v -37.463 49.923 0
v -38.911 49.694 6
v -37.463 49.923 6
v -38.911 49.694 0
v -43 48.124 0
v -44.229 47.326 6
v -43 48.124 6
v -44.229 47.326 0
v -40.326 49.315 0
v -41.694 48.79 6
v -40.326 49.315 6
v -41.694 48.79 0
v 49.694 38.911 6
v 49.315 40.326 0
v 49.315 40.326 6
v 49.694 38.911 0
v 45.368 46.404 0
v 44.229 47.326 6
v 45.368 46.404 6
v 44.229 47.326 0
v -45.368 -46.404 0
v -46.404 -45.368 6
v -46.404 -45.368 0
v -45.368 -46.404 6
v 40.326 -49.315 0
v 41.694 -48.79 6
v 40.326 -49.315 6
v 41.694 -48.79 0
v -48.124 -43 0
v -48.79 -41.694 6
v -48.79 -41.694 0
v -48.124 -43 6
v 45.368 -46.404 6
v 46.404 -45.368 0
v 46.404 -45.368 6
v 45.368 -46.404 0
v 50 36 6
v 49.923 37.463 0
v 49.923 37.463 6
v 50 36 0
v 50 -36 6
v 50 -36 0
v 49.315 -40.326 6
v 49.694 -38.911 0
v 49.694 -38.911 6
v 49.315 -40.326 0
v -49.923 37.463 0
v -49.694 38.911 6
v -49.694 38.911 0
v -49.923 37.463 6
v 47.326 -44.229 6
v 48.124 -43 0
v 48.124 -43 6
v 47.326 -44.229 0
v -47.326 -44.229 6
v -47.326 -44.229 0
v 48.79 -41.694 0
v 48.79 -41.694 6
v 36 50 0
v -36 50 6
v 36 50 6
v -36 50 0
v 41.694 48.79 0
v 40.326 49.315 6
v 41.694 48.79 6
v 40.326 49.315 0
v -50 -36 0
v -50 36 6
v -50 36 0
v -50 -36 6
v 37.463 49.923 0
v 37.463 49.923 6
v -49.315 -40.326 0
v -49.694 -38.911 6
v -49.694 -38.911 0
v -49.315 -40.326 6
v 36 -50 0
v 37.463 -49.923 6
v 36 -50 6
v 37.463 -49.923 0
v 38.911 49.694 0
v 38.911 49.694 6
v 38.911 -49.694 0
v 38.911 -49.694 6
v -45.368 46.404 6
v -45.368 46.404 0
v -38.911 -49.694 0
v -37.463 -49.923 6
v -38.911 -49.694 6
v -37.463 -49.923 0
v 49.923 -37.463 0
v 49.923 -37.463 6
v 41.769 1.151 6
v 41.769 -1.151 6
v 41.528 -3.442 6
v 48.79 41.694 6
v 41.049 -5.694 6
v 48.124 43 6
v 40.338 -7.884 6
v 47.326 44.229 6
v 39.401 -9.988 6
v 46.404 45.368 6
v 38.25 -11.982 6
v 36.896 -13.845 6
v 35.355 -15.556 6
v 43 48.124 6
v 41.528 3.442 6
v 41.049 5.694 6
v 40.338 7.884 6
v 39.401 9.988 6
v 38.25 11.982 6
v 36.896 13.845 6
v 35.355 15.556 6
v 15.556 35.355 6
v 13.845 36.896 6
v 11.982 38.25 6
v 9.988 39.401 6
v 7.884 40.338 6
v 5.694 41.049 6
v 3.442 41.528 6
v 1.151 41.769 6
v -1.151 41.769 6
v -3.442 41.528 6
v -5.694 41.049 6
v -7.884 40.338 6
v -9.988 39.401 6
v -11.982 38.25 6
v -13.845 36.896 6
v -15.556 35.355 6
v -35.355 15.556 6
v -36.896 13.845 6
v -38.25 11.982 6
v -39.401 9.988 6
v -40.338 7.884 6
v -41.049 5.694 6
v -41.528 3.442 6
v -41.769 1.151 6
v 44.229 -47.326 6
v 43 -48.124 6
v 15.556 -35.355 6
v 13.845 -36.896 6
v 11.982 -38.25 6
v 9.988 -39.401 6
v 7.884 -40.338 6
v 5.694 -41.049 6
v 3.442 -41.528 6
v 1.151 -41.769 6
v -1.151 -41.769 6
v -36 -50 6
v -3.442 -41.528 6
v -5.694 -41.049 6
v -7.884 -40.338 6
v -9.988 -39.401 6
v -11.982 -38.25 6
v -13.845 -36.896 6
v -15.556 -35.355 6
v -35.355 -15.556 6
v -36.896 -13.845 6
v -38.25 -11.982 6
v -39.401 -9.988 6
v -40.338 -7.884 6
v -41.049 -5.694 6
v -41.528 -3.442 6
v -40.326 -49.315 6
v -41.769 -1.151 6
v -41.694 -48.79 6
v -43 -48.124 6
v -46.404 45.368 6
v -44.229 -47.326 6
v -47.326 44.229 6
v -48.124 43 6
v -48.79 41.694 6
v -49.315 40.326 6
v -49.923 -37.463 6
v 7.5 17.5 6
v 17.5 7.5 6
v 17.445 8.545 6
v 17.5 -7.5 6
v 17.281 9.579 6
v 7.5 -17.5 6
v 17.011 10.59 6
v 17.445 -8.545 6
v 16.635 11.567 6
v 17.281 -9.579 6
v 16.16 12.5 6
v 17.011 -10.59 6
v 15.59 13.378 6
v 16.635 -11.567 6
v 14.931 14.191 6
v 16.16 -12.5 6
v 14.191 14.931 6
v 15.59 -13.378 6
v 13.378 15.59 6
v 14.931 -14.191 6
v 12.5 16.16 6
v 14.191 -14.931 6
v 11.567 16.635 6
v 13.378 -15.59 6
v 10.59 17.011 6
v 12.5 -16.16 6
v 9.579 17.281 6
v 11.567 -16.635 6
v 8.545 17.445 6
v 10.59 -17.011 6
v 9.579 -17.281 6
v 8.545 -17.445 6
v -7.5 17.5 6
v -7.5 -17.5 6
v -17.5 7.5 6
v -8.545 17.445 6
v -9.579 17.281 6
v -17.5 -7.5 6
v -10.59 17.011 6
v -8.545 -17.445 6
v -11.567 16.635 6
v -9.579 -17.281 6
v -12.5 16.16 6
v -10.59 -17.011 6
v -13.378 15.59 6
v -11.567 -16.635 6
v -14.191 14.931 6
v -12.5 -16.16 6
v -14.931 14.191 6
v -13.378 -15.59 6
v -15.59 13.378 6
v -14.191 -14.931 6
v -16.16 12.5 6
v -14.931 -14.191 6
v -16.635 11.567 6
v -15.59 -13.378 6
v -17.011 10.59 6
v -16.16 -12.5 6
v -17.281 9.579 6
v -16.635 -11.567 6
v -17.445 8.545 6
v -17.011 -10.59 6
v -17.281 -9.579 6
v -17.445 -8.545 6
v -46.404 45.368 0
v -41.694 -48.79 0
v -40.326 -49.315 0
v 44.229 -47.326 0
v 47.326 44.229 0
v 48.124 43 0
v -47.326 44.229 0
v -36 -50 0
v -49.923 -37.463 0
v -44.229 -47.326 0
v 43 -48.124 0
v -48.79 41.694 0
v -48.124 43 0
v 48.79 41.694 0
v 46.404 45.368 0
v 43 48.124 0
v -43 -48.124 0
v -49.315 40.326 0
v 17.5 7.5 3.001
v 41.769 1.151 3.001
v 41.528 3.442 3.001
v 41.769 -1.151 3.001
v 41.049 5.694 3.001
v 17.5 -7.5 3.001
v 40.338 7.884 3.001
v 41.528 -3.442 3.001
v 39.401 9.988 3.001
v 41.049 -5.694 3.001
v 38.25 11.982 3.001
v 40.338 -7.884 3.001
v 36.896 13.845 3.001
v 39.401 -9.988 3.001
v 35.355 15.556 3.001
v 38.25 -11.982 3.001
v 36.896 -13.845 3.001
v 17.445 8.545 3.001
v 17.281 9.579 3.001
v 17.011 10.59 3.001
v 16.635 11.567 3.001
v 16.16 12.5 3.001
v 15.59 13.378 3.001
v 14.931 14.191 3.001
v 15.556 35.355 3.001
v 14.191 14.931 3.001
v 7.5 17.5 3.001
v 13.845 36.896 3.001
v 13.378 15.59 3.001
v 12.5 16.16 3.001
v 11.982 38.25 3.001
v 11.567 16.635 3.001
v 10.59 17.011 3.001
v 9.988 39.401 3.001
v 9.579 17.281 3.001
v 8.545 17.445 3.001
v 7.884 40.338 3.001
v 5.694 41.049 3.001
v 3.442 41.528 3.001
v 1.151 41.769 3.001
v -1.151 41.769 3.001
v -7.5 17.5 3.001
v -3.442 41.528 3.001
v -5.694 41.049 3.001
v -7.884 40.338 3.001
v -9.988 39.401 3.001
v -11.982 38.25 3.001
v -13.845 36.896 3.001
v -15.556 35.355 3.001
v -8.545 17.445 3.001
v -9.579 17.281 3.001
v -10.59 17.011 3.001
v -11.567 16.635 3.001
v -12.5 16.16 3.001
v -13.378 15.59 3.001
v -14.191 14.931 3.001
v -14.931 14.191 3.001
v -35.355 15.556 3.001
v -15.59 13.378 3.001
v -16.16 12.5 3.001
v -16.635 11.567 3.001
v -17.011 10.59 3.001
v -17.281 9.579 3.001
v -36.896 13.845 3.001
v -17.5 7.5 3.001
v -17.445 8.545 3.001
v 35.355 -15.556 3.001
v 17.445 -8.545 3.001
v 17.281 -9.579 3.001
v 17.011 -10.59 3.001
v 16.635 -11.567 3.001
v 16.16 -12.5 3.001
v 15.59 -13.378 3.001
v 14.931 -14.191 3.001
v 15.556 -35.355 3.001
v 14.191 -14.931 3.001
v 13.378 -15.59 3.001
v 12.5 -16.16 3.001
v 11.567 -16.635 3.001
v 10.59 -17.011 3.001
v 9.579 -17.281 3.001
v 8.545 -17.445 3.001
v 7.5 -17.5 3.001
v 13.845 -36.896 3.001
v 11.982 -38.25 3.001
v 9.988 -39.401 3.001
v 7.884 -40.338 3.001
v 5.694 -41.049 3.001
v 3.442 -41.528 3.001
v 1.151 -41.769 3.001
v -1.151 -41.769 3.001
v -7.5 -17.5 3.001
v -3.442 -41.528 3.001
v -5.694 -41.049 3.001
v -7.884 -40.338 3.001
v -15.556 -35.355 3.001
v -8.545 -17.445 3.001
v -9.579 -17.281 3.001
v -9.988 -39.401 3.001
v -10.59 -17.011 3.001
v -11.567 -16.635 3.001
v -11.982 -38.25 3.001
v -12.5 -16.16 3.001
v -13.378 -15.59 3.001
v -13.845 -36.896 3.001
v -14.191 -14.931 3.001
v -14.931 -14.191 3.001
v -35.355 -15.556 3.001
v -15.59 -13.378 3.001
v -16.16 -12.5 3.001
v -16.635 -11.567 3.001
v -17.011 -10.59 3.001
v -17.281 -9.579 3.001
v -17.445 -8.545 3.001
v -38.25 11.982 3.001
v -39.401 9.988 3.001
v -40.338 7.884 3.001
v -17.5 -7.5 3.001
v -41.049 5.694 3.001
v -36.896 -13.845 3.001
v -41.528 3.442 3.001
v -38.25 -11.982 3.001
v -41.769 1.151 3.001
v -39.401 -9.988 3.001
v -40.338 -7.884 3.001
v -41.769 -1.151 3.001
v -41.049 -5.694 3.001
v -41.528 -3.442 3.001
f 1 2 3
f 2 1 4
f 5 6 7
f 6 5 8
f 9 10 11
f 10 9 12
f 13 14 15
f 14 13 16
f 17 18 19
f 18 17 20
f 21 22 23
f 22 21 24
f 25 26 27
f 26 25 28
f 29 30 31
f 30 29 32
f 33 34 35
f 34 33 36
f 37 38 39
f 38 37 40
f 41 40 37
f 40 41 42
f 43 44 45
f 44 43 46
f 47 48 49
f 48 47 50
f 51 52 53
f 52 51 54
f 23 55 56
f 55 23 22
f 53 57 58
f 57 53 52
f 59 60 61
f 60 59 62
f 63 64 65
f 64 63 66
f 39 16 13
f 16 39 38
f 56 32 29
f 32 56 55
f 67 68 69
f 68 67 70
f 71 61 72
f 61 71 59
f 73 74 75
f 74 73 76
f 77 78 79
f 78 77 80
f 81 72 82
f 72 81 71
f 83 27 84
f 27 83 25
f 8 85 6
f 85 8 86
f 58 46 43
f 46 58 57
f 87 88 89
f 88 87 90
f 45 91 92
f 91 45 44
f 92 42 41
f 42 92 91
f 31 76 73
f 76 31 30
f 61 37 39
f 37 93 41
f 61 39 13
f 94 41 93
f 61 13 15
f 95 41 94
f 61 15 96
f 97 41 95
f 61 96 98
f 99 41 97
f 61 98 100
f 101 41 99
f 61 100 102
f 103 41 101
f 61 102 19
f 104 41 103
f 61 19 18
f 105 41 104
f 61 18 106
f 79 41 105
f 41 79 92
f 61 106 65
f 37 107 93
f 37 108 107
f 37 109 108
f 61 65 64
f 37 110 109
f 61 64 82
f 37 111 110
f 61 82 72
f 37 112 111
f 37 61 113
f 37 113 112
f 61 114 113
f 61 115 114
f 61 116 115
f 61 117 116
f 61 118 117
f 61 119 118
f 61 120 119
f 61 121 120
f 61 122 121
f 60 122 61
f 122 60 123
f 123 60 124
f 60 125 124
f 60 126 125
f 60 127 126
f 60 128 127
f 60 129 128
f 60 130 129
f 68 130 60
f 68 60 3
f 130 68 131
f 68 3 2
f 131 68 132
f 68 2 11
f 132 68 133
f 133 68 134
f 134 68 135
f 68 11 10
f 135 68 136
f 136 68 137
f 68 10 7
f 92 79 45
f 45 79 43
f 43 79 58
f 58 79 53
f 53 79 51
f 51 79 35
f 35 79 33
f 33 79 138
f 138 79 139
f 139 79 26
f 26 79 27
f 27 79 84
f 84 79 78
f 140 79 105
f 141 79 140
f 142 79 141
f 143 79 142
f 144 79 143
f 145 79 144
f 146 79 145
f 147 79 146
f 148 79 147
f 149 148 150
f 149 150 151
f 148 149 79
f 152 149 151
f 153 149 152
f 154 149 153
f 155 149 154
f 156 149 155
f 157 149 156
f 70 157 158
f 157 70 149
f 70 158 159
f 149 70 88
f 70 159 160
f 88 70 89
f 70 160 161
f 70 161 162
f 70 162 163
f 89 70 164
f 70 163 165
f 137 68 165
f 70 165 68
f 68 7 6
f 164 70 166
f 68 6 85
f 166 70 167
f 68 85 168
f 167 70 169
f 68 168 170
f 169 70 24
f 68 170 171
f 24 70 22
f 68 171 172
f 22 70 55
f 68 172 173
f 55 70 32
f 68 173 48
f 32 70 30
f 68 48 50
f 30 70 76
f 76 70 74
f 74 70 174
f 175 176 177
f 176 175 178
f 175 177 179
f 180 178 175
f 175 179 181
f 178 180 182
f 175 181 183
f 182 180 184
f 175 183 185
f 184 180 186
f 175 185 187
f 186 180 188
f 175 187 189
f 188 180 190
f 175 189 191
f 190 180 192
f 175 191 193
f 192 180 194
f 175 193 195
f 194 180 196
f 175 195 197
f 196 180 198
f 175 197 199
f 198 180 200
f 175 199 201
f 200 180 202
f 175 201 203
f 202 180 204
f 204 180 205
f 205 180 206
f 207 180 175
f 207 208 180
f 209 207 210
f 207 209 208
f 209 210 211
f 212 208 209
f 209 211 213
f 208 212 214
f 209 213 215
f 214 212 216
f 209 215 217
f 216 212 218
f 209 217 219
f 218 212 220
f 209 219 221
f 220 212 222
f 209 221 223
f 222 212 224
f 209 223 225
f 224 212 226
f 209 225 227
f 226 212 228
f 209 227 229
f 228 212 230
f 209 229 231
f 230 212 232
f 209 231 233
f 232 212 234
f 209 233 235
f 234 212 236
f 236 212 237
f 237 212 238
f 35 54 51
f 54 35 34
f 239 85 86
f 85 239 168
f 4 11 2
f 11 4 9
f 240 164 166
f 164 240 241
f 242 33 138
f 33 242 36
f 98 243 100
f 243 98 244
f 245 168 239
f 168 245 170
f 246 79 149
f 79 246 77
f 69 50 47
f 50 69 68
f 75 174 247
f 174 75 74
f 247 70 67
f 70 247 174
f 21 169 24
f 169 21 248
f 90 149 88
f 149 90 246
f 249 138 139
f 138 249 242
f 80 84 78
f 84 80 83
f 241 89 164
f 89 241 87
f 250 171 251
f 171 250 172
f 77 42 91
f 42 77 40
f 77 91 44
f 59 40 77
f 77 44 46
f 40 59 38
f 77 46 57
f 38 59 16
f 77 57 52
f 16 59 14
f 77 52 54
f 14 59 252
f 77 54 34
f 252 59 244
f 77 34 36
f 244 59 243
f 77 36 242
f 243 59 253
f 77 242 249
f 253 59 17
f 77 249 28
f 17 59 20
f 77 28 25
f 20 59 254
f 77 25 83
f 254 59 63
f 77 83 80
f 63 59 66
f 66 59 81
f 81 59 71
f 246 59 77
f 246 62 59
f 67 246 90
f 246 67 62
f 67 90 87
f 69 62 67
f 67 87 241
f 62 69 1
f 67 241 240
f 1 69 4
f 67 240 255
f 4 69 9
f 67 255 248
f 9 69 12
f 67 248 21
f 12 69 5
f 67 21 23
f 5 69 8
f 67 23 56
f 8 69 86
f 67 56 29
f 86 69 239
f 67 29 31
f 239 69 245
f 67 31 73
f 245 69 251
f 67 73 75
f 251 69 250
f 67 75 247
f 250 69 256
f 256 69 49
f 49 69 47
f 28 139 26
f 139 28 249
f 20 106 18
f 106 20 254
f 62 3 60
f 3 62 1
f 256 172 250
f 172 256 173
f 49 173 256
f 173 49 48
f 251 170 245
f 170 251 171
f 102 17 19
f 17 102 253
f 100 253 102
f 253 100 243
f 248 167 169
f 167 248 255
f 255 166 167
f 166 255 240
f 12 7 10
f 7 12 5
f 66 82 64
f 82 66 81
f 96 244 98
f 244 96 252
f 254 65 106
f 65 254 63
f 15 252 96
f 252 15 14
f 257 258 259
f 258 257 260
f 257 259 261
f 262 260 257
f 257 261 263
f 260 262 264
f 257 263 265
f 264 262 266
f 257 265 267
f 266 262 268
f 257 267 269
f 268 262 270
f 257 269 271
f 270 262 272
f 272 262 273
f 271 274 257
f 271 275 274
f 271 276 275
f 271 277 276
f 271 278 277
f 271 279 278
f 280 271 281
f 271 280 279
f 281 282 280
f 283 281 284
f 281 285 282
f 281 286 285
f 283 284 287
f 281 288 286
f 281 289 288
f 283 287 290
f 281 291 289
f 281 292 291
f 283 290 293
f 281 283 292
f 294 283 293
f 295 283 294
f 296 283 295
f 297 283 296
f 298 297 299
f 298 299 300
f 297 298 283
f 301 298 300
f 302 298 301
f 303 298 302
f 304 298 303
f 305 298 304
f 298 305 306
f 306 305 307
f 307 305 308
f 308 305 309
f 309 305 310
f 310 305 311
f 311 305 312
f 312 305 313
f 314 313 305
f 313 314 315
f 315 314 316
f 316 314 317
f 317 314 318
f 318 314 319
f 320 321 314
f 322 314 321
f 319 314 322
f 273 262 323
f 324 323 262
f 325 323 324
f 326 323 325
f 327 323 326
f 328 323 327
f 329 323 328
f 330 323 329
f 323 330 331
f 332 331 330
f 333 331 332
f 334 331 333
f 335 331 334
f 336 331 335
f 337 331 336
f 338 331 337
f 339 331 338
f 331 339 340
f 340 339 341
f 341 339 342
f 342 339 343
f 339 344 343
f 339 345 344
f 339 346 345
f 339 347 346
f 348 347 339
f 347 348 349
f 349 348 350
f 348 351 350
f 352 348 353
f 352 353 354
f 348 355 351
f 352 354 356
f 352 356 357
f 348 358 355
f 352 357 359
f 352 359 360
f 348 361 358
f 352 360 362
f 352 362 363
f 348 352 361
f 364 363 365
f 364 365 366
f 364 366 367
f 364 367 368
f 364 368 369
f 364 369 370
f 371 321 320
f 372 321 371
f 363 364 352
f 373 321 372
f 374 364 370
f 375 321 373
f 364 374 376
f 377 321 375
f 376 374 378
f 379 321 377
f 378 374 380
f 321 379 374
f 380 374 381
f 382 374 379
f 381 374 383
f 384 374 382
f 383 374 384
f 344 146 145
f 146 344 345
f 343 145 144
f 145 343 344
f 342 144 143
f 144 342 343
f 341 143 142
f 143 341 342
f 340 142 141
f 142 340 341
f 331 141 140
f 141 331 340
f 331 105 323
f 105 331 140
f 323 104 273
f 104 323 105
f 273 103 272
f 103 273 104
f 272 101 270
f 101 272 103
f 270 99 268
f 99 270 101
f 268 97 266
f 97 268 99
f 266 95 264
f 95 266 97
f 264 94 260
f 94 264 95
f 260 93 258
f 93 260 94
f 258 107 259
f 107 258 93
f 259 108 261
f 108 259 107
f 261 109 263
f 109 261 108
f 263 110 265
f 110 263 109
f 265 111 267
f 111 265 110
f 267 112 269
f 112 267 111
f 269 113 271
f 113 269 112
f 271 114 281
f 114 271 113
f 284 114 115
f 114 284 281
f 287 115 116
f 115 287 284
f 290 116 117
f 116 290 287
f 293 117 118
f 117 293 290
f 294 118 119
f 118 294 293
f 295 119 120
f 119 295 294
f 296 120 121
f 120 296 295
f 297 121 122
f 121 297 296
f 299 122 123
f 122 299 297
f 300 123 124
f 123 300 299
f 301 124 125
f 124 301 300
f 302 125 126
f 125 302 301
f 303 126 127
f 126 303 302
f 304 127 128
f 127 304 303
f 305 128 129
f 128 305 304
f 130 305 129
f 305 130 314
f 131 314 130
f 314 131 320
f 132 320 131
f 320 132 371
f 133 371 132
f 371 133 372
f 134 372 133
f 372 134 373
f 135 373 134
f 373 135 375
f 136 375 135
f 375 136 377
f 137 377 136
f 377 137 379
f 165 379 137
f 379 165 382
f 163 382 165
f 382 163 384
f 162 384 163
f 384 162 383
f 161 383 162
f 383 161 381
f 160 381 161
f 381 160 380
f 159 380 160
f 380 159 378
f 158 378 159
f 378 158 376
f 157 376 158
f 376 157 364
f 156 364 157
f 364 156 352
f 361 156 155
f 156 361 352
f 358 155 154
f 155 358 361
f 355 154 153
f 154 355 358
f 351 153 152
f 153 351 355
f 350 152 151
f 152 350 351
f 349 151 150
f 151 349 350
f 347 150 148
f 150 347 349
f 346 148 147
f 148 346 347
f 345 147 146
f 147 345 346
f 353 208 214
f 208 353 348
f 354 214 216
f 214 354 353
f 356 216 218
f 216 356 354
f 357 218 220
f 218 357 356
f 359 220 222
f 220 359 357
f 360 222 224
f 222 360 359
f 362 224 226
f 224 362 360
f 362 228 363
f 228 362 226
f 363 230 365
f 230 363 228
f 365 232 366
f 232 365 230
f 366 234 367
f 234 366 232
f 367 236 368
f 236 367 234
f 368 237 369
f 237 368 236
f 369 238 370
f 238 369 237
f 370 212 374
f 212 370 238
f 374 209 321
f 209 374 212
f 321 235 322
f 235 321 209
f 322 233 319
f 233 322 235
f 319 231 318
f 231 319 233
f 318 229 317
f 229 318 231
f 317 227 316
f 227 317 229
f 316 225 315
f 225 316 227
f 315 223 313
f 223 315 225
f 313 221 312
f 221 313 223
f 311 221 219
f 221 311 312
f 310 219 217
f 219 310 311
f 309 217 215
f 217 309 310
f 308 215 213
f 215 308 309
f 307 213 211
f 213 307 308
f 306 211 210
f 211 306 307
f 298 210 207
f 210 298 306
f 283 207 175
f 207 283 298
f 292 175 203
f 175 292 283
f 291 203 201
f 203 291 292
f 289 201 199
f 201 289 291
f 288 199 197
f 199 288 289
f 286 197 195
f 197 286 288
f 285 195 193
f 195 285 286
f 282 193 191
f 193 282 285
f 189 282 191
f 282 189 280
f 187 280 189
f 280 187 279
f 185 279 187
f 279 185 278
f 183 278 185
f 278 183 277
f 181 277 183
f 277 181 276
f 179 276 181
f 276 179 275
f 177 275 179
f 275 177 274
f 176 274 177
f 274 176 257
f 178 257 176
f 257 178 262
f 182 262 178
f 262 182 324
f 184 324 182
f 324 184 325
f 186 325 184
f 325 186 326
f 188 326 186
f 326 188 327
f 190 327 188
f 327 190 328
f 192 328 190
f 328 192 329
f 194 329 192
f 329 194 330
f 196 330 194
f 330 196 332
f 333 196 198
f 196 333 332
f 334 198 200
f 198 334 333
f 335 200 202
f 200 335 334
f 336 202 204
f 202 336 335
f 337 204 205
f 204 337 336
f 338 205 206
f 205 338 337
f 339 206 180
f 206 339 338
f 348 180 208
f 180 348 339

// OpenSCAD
// file: coaster_lib.scad
$fa = 6;
$fs = 0.875;

module coaster_base_3d(size, thickness, border_radius) {
    linear_extrude(height = thickness) {
        minkowski() {
            cube_size = size - border_radius * 2;

            square(size = [cube_size, cube_size], center = true);
            circle(r = border_radius);
        }
    }
}

module epayslips_logo_2d(size) {
    difference() {
        rotate(a = 45)
        minkowski() {
            roundness = 22;
            cube_size = size * 0.5 - roundness;

            square(size = [cube_size, cube_size], center = true);
            circle(r = roundness);
        }

        minkowski() {
            roundness = 10;
            cube_size = size * 0.25 - roundness;

            square(size = [cube_size, cube_size], center = true);
            circle(r = roundness);
        }
    }
}

module datacode_logo_2d(size) {
    difference() {
        rotate(a = 45 / 2)
        minkowski() {
            roundness = 8;
            circle(r = size * 0.38 - roundness, $fn = 8);
            circle(r = roundness);
        }

        circle(r = size * 0.12);

        translate([0, size / 4, 0]) {
            square(size = [size * 0.1, size / 2], center = true);
        }
    }
}

module sj_logo_2d(size) {
    rotate(a = 45 / 2)
    difference() {
        roundness = 8;

        minkowski() {
            circle(r = size * 0.45 - roundness, $fn = 8);
            circle(r = roundness);
        }

        minkowski() {
            circle(r = size * 0.385 - roundness, $fn = 8);
            circle(r = roundness);
        }
    }

    text_size = size * 0.2;
    text_offset = text_size / 2 + 2;

    translate([0, text_offset, 0])
    text(
        text = "JAC",
        halign = "center",
        valign = "center",
        font = "Roboto Mono for Powerline:style=Bold",
        size = size * 0.2
    );

    translate([0, -text_offset, 0])
    text(
        text = "UZI",
        halign = "center",
        valign = "center",
        font = "Roboto Mono for Powerline:style=Bold",
        size = size * 0.2
    );
}
// main file
include<coaster_lib.scad>;

$fa = 6;
$fs = 0.875;

size = 100;
border_radius = 14;
thickness = 6;

difference() {
    coaster_base_3d(size, thickness, border_radius);

    translate([0, 0, thickness / 2 + 0.001]) {
        linear_extrude(height = thickness / 2) {
            epayslips_logo_2d(size);
        }
    }
}
